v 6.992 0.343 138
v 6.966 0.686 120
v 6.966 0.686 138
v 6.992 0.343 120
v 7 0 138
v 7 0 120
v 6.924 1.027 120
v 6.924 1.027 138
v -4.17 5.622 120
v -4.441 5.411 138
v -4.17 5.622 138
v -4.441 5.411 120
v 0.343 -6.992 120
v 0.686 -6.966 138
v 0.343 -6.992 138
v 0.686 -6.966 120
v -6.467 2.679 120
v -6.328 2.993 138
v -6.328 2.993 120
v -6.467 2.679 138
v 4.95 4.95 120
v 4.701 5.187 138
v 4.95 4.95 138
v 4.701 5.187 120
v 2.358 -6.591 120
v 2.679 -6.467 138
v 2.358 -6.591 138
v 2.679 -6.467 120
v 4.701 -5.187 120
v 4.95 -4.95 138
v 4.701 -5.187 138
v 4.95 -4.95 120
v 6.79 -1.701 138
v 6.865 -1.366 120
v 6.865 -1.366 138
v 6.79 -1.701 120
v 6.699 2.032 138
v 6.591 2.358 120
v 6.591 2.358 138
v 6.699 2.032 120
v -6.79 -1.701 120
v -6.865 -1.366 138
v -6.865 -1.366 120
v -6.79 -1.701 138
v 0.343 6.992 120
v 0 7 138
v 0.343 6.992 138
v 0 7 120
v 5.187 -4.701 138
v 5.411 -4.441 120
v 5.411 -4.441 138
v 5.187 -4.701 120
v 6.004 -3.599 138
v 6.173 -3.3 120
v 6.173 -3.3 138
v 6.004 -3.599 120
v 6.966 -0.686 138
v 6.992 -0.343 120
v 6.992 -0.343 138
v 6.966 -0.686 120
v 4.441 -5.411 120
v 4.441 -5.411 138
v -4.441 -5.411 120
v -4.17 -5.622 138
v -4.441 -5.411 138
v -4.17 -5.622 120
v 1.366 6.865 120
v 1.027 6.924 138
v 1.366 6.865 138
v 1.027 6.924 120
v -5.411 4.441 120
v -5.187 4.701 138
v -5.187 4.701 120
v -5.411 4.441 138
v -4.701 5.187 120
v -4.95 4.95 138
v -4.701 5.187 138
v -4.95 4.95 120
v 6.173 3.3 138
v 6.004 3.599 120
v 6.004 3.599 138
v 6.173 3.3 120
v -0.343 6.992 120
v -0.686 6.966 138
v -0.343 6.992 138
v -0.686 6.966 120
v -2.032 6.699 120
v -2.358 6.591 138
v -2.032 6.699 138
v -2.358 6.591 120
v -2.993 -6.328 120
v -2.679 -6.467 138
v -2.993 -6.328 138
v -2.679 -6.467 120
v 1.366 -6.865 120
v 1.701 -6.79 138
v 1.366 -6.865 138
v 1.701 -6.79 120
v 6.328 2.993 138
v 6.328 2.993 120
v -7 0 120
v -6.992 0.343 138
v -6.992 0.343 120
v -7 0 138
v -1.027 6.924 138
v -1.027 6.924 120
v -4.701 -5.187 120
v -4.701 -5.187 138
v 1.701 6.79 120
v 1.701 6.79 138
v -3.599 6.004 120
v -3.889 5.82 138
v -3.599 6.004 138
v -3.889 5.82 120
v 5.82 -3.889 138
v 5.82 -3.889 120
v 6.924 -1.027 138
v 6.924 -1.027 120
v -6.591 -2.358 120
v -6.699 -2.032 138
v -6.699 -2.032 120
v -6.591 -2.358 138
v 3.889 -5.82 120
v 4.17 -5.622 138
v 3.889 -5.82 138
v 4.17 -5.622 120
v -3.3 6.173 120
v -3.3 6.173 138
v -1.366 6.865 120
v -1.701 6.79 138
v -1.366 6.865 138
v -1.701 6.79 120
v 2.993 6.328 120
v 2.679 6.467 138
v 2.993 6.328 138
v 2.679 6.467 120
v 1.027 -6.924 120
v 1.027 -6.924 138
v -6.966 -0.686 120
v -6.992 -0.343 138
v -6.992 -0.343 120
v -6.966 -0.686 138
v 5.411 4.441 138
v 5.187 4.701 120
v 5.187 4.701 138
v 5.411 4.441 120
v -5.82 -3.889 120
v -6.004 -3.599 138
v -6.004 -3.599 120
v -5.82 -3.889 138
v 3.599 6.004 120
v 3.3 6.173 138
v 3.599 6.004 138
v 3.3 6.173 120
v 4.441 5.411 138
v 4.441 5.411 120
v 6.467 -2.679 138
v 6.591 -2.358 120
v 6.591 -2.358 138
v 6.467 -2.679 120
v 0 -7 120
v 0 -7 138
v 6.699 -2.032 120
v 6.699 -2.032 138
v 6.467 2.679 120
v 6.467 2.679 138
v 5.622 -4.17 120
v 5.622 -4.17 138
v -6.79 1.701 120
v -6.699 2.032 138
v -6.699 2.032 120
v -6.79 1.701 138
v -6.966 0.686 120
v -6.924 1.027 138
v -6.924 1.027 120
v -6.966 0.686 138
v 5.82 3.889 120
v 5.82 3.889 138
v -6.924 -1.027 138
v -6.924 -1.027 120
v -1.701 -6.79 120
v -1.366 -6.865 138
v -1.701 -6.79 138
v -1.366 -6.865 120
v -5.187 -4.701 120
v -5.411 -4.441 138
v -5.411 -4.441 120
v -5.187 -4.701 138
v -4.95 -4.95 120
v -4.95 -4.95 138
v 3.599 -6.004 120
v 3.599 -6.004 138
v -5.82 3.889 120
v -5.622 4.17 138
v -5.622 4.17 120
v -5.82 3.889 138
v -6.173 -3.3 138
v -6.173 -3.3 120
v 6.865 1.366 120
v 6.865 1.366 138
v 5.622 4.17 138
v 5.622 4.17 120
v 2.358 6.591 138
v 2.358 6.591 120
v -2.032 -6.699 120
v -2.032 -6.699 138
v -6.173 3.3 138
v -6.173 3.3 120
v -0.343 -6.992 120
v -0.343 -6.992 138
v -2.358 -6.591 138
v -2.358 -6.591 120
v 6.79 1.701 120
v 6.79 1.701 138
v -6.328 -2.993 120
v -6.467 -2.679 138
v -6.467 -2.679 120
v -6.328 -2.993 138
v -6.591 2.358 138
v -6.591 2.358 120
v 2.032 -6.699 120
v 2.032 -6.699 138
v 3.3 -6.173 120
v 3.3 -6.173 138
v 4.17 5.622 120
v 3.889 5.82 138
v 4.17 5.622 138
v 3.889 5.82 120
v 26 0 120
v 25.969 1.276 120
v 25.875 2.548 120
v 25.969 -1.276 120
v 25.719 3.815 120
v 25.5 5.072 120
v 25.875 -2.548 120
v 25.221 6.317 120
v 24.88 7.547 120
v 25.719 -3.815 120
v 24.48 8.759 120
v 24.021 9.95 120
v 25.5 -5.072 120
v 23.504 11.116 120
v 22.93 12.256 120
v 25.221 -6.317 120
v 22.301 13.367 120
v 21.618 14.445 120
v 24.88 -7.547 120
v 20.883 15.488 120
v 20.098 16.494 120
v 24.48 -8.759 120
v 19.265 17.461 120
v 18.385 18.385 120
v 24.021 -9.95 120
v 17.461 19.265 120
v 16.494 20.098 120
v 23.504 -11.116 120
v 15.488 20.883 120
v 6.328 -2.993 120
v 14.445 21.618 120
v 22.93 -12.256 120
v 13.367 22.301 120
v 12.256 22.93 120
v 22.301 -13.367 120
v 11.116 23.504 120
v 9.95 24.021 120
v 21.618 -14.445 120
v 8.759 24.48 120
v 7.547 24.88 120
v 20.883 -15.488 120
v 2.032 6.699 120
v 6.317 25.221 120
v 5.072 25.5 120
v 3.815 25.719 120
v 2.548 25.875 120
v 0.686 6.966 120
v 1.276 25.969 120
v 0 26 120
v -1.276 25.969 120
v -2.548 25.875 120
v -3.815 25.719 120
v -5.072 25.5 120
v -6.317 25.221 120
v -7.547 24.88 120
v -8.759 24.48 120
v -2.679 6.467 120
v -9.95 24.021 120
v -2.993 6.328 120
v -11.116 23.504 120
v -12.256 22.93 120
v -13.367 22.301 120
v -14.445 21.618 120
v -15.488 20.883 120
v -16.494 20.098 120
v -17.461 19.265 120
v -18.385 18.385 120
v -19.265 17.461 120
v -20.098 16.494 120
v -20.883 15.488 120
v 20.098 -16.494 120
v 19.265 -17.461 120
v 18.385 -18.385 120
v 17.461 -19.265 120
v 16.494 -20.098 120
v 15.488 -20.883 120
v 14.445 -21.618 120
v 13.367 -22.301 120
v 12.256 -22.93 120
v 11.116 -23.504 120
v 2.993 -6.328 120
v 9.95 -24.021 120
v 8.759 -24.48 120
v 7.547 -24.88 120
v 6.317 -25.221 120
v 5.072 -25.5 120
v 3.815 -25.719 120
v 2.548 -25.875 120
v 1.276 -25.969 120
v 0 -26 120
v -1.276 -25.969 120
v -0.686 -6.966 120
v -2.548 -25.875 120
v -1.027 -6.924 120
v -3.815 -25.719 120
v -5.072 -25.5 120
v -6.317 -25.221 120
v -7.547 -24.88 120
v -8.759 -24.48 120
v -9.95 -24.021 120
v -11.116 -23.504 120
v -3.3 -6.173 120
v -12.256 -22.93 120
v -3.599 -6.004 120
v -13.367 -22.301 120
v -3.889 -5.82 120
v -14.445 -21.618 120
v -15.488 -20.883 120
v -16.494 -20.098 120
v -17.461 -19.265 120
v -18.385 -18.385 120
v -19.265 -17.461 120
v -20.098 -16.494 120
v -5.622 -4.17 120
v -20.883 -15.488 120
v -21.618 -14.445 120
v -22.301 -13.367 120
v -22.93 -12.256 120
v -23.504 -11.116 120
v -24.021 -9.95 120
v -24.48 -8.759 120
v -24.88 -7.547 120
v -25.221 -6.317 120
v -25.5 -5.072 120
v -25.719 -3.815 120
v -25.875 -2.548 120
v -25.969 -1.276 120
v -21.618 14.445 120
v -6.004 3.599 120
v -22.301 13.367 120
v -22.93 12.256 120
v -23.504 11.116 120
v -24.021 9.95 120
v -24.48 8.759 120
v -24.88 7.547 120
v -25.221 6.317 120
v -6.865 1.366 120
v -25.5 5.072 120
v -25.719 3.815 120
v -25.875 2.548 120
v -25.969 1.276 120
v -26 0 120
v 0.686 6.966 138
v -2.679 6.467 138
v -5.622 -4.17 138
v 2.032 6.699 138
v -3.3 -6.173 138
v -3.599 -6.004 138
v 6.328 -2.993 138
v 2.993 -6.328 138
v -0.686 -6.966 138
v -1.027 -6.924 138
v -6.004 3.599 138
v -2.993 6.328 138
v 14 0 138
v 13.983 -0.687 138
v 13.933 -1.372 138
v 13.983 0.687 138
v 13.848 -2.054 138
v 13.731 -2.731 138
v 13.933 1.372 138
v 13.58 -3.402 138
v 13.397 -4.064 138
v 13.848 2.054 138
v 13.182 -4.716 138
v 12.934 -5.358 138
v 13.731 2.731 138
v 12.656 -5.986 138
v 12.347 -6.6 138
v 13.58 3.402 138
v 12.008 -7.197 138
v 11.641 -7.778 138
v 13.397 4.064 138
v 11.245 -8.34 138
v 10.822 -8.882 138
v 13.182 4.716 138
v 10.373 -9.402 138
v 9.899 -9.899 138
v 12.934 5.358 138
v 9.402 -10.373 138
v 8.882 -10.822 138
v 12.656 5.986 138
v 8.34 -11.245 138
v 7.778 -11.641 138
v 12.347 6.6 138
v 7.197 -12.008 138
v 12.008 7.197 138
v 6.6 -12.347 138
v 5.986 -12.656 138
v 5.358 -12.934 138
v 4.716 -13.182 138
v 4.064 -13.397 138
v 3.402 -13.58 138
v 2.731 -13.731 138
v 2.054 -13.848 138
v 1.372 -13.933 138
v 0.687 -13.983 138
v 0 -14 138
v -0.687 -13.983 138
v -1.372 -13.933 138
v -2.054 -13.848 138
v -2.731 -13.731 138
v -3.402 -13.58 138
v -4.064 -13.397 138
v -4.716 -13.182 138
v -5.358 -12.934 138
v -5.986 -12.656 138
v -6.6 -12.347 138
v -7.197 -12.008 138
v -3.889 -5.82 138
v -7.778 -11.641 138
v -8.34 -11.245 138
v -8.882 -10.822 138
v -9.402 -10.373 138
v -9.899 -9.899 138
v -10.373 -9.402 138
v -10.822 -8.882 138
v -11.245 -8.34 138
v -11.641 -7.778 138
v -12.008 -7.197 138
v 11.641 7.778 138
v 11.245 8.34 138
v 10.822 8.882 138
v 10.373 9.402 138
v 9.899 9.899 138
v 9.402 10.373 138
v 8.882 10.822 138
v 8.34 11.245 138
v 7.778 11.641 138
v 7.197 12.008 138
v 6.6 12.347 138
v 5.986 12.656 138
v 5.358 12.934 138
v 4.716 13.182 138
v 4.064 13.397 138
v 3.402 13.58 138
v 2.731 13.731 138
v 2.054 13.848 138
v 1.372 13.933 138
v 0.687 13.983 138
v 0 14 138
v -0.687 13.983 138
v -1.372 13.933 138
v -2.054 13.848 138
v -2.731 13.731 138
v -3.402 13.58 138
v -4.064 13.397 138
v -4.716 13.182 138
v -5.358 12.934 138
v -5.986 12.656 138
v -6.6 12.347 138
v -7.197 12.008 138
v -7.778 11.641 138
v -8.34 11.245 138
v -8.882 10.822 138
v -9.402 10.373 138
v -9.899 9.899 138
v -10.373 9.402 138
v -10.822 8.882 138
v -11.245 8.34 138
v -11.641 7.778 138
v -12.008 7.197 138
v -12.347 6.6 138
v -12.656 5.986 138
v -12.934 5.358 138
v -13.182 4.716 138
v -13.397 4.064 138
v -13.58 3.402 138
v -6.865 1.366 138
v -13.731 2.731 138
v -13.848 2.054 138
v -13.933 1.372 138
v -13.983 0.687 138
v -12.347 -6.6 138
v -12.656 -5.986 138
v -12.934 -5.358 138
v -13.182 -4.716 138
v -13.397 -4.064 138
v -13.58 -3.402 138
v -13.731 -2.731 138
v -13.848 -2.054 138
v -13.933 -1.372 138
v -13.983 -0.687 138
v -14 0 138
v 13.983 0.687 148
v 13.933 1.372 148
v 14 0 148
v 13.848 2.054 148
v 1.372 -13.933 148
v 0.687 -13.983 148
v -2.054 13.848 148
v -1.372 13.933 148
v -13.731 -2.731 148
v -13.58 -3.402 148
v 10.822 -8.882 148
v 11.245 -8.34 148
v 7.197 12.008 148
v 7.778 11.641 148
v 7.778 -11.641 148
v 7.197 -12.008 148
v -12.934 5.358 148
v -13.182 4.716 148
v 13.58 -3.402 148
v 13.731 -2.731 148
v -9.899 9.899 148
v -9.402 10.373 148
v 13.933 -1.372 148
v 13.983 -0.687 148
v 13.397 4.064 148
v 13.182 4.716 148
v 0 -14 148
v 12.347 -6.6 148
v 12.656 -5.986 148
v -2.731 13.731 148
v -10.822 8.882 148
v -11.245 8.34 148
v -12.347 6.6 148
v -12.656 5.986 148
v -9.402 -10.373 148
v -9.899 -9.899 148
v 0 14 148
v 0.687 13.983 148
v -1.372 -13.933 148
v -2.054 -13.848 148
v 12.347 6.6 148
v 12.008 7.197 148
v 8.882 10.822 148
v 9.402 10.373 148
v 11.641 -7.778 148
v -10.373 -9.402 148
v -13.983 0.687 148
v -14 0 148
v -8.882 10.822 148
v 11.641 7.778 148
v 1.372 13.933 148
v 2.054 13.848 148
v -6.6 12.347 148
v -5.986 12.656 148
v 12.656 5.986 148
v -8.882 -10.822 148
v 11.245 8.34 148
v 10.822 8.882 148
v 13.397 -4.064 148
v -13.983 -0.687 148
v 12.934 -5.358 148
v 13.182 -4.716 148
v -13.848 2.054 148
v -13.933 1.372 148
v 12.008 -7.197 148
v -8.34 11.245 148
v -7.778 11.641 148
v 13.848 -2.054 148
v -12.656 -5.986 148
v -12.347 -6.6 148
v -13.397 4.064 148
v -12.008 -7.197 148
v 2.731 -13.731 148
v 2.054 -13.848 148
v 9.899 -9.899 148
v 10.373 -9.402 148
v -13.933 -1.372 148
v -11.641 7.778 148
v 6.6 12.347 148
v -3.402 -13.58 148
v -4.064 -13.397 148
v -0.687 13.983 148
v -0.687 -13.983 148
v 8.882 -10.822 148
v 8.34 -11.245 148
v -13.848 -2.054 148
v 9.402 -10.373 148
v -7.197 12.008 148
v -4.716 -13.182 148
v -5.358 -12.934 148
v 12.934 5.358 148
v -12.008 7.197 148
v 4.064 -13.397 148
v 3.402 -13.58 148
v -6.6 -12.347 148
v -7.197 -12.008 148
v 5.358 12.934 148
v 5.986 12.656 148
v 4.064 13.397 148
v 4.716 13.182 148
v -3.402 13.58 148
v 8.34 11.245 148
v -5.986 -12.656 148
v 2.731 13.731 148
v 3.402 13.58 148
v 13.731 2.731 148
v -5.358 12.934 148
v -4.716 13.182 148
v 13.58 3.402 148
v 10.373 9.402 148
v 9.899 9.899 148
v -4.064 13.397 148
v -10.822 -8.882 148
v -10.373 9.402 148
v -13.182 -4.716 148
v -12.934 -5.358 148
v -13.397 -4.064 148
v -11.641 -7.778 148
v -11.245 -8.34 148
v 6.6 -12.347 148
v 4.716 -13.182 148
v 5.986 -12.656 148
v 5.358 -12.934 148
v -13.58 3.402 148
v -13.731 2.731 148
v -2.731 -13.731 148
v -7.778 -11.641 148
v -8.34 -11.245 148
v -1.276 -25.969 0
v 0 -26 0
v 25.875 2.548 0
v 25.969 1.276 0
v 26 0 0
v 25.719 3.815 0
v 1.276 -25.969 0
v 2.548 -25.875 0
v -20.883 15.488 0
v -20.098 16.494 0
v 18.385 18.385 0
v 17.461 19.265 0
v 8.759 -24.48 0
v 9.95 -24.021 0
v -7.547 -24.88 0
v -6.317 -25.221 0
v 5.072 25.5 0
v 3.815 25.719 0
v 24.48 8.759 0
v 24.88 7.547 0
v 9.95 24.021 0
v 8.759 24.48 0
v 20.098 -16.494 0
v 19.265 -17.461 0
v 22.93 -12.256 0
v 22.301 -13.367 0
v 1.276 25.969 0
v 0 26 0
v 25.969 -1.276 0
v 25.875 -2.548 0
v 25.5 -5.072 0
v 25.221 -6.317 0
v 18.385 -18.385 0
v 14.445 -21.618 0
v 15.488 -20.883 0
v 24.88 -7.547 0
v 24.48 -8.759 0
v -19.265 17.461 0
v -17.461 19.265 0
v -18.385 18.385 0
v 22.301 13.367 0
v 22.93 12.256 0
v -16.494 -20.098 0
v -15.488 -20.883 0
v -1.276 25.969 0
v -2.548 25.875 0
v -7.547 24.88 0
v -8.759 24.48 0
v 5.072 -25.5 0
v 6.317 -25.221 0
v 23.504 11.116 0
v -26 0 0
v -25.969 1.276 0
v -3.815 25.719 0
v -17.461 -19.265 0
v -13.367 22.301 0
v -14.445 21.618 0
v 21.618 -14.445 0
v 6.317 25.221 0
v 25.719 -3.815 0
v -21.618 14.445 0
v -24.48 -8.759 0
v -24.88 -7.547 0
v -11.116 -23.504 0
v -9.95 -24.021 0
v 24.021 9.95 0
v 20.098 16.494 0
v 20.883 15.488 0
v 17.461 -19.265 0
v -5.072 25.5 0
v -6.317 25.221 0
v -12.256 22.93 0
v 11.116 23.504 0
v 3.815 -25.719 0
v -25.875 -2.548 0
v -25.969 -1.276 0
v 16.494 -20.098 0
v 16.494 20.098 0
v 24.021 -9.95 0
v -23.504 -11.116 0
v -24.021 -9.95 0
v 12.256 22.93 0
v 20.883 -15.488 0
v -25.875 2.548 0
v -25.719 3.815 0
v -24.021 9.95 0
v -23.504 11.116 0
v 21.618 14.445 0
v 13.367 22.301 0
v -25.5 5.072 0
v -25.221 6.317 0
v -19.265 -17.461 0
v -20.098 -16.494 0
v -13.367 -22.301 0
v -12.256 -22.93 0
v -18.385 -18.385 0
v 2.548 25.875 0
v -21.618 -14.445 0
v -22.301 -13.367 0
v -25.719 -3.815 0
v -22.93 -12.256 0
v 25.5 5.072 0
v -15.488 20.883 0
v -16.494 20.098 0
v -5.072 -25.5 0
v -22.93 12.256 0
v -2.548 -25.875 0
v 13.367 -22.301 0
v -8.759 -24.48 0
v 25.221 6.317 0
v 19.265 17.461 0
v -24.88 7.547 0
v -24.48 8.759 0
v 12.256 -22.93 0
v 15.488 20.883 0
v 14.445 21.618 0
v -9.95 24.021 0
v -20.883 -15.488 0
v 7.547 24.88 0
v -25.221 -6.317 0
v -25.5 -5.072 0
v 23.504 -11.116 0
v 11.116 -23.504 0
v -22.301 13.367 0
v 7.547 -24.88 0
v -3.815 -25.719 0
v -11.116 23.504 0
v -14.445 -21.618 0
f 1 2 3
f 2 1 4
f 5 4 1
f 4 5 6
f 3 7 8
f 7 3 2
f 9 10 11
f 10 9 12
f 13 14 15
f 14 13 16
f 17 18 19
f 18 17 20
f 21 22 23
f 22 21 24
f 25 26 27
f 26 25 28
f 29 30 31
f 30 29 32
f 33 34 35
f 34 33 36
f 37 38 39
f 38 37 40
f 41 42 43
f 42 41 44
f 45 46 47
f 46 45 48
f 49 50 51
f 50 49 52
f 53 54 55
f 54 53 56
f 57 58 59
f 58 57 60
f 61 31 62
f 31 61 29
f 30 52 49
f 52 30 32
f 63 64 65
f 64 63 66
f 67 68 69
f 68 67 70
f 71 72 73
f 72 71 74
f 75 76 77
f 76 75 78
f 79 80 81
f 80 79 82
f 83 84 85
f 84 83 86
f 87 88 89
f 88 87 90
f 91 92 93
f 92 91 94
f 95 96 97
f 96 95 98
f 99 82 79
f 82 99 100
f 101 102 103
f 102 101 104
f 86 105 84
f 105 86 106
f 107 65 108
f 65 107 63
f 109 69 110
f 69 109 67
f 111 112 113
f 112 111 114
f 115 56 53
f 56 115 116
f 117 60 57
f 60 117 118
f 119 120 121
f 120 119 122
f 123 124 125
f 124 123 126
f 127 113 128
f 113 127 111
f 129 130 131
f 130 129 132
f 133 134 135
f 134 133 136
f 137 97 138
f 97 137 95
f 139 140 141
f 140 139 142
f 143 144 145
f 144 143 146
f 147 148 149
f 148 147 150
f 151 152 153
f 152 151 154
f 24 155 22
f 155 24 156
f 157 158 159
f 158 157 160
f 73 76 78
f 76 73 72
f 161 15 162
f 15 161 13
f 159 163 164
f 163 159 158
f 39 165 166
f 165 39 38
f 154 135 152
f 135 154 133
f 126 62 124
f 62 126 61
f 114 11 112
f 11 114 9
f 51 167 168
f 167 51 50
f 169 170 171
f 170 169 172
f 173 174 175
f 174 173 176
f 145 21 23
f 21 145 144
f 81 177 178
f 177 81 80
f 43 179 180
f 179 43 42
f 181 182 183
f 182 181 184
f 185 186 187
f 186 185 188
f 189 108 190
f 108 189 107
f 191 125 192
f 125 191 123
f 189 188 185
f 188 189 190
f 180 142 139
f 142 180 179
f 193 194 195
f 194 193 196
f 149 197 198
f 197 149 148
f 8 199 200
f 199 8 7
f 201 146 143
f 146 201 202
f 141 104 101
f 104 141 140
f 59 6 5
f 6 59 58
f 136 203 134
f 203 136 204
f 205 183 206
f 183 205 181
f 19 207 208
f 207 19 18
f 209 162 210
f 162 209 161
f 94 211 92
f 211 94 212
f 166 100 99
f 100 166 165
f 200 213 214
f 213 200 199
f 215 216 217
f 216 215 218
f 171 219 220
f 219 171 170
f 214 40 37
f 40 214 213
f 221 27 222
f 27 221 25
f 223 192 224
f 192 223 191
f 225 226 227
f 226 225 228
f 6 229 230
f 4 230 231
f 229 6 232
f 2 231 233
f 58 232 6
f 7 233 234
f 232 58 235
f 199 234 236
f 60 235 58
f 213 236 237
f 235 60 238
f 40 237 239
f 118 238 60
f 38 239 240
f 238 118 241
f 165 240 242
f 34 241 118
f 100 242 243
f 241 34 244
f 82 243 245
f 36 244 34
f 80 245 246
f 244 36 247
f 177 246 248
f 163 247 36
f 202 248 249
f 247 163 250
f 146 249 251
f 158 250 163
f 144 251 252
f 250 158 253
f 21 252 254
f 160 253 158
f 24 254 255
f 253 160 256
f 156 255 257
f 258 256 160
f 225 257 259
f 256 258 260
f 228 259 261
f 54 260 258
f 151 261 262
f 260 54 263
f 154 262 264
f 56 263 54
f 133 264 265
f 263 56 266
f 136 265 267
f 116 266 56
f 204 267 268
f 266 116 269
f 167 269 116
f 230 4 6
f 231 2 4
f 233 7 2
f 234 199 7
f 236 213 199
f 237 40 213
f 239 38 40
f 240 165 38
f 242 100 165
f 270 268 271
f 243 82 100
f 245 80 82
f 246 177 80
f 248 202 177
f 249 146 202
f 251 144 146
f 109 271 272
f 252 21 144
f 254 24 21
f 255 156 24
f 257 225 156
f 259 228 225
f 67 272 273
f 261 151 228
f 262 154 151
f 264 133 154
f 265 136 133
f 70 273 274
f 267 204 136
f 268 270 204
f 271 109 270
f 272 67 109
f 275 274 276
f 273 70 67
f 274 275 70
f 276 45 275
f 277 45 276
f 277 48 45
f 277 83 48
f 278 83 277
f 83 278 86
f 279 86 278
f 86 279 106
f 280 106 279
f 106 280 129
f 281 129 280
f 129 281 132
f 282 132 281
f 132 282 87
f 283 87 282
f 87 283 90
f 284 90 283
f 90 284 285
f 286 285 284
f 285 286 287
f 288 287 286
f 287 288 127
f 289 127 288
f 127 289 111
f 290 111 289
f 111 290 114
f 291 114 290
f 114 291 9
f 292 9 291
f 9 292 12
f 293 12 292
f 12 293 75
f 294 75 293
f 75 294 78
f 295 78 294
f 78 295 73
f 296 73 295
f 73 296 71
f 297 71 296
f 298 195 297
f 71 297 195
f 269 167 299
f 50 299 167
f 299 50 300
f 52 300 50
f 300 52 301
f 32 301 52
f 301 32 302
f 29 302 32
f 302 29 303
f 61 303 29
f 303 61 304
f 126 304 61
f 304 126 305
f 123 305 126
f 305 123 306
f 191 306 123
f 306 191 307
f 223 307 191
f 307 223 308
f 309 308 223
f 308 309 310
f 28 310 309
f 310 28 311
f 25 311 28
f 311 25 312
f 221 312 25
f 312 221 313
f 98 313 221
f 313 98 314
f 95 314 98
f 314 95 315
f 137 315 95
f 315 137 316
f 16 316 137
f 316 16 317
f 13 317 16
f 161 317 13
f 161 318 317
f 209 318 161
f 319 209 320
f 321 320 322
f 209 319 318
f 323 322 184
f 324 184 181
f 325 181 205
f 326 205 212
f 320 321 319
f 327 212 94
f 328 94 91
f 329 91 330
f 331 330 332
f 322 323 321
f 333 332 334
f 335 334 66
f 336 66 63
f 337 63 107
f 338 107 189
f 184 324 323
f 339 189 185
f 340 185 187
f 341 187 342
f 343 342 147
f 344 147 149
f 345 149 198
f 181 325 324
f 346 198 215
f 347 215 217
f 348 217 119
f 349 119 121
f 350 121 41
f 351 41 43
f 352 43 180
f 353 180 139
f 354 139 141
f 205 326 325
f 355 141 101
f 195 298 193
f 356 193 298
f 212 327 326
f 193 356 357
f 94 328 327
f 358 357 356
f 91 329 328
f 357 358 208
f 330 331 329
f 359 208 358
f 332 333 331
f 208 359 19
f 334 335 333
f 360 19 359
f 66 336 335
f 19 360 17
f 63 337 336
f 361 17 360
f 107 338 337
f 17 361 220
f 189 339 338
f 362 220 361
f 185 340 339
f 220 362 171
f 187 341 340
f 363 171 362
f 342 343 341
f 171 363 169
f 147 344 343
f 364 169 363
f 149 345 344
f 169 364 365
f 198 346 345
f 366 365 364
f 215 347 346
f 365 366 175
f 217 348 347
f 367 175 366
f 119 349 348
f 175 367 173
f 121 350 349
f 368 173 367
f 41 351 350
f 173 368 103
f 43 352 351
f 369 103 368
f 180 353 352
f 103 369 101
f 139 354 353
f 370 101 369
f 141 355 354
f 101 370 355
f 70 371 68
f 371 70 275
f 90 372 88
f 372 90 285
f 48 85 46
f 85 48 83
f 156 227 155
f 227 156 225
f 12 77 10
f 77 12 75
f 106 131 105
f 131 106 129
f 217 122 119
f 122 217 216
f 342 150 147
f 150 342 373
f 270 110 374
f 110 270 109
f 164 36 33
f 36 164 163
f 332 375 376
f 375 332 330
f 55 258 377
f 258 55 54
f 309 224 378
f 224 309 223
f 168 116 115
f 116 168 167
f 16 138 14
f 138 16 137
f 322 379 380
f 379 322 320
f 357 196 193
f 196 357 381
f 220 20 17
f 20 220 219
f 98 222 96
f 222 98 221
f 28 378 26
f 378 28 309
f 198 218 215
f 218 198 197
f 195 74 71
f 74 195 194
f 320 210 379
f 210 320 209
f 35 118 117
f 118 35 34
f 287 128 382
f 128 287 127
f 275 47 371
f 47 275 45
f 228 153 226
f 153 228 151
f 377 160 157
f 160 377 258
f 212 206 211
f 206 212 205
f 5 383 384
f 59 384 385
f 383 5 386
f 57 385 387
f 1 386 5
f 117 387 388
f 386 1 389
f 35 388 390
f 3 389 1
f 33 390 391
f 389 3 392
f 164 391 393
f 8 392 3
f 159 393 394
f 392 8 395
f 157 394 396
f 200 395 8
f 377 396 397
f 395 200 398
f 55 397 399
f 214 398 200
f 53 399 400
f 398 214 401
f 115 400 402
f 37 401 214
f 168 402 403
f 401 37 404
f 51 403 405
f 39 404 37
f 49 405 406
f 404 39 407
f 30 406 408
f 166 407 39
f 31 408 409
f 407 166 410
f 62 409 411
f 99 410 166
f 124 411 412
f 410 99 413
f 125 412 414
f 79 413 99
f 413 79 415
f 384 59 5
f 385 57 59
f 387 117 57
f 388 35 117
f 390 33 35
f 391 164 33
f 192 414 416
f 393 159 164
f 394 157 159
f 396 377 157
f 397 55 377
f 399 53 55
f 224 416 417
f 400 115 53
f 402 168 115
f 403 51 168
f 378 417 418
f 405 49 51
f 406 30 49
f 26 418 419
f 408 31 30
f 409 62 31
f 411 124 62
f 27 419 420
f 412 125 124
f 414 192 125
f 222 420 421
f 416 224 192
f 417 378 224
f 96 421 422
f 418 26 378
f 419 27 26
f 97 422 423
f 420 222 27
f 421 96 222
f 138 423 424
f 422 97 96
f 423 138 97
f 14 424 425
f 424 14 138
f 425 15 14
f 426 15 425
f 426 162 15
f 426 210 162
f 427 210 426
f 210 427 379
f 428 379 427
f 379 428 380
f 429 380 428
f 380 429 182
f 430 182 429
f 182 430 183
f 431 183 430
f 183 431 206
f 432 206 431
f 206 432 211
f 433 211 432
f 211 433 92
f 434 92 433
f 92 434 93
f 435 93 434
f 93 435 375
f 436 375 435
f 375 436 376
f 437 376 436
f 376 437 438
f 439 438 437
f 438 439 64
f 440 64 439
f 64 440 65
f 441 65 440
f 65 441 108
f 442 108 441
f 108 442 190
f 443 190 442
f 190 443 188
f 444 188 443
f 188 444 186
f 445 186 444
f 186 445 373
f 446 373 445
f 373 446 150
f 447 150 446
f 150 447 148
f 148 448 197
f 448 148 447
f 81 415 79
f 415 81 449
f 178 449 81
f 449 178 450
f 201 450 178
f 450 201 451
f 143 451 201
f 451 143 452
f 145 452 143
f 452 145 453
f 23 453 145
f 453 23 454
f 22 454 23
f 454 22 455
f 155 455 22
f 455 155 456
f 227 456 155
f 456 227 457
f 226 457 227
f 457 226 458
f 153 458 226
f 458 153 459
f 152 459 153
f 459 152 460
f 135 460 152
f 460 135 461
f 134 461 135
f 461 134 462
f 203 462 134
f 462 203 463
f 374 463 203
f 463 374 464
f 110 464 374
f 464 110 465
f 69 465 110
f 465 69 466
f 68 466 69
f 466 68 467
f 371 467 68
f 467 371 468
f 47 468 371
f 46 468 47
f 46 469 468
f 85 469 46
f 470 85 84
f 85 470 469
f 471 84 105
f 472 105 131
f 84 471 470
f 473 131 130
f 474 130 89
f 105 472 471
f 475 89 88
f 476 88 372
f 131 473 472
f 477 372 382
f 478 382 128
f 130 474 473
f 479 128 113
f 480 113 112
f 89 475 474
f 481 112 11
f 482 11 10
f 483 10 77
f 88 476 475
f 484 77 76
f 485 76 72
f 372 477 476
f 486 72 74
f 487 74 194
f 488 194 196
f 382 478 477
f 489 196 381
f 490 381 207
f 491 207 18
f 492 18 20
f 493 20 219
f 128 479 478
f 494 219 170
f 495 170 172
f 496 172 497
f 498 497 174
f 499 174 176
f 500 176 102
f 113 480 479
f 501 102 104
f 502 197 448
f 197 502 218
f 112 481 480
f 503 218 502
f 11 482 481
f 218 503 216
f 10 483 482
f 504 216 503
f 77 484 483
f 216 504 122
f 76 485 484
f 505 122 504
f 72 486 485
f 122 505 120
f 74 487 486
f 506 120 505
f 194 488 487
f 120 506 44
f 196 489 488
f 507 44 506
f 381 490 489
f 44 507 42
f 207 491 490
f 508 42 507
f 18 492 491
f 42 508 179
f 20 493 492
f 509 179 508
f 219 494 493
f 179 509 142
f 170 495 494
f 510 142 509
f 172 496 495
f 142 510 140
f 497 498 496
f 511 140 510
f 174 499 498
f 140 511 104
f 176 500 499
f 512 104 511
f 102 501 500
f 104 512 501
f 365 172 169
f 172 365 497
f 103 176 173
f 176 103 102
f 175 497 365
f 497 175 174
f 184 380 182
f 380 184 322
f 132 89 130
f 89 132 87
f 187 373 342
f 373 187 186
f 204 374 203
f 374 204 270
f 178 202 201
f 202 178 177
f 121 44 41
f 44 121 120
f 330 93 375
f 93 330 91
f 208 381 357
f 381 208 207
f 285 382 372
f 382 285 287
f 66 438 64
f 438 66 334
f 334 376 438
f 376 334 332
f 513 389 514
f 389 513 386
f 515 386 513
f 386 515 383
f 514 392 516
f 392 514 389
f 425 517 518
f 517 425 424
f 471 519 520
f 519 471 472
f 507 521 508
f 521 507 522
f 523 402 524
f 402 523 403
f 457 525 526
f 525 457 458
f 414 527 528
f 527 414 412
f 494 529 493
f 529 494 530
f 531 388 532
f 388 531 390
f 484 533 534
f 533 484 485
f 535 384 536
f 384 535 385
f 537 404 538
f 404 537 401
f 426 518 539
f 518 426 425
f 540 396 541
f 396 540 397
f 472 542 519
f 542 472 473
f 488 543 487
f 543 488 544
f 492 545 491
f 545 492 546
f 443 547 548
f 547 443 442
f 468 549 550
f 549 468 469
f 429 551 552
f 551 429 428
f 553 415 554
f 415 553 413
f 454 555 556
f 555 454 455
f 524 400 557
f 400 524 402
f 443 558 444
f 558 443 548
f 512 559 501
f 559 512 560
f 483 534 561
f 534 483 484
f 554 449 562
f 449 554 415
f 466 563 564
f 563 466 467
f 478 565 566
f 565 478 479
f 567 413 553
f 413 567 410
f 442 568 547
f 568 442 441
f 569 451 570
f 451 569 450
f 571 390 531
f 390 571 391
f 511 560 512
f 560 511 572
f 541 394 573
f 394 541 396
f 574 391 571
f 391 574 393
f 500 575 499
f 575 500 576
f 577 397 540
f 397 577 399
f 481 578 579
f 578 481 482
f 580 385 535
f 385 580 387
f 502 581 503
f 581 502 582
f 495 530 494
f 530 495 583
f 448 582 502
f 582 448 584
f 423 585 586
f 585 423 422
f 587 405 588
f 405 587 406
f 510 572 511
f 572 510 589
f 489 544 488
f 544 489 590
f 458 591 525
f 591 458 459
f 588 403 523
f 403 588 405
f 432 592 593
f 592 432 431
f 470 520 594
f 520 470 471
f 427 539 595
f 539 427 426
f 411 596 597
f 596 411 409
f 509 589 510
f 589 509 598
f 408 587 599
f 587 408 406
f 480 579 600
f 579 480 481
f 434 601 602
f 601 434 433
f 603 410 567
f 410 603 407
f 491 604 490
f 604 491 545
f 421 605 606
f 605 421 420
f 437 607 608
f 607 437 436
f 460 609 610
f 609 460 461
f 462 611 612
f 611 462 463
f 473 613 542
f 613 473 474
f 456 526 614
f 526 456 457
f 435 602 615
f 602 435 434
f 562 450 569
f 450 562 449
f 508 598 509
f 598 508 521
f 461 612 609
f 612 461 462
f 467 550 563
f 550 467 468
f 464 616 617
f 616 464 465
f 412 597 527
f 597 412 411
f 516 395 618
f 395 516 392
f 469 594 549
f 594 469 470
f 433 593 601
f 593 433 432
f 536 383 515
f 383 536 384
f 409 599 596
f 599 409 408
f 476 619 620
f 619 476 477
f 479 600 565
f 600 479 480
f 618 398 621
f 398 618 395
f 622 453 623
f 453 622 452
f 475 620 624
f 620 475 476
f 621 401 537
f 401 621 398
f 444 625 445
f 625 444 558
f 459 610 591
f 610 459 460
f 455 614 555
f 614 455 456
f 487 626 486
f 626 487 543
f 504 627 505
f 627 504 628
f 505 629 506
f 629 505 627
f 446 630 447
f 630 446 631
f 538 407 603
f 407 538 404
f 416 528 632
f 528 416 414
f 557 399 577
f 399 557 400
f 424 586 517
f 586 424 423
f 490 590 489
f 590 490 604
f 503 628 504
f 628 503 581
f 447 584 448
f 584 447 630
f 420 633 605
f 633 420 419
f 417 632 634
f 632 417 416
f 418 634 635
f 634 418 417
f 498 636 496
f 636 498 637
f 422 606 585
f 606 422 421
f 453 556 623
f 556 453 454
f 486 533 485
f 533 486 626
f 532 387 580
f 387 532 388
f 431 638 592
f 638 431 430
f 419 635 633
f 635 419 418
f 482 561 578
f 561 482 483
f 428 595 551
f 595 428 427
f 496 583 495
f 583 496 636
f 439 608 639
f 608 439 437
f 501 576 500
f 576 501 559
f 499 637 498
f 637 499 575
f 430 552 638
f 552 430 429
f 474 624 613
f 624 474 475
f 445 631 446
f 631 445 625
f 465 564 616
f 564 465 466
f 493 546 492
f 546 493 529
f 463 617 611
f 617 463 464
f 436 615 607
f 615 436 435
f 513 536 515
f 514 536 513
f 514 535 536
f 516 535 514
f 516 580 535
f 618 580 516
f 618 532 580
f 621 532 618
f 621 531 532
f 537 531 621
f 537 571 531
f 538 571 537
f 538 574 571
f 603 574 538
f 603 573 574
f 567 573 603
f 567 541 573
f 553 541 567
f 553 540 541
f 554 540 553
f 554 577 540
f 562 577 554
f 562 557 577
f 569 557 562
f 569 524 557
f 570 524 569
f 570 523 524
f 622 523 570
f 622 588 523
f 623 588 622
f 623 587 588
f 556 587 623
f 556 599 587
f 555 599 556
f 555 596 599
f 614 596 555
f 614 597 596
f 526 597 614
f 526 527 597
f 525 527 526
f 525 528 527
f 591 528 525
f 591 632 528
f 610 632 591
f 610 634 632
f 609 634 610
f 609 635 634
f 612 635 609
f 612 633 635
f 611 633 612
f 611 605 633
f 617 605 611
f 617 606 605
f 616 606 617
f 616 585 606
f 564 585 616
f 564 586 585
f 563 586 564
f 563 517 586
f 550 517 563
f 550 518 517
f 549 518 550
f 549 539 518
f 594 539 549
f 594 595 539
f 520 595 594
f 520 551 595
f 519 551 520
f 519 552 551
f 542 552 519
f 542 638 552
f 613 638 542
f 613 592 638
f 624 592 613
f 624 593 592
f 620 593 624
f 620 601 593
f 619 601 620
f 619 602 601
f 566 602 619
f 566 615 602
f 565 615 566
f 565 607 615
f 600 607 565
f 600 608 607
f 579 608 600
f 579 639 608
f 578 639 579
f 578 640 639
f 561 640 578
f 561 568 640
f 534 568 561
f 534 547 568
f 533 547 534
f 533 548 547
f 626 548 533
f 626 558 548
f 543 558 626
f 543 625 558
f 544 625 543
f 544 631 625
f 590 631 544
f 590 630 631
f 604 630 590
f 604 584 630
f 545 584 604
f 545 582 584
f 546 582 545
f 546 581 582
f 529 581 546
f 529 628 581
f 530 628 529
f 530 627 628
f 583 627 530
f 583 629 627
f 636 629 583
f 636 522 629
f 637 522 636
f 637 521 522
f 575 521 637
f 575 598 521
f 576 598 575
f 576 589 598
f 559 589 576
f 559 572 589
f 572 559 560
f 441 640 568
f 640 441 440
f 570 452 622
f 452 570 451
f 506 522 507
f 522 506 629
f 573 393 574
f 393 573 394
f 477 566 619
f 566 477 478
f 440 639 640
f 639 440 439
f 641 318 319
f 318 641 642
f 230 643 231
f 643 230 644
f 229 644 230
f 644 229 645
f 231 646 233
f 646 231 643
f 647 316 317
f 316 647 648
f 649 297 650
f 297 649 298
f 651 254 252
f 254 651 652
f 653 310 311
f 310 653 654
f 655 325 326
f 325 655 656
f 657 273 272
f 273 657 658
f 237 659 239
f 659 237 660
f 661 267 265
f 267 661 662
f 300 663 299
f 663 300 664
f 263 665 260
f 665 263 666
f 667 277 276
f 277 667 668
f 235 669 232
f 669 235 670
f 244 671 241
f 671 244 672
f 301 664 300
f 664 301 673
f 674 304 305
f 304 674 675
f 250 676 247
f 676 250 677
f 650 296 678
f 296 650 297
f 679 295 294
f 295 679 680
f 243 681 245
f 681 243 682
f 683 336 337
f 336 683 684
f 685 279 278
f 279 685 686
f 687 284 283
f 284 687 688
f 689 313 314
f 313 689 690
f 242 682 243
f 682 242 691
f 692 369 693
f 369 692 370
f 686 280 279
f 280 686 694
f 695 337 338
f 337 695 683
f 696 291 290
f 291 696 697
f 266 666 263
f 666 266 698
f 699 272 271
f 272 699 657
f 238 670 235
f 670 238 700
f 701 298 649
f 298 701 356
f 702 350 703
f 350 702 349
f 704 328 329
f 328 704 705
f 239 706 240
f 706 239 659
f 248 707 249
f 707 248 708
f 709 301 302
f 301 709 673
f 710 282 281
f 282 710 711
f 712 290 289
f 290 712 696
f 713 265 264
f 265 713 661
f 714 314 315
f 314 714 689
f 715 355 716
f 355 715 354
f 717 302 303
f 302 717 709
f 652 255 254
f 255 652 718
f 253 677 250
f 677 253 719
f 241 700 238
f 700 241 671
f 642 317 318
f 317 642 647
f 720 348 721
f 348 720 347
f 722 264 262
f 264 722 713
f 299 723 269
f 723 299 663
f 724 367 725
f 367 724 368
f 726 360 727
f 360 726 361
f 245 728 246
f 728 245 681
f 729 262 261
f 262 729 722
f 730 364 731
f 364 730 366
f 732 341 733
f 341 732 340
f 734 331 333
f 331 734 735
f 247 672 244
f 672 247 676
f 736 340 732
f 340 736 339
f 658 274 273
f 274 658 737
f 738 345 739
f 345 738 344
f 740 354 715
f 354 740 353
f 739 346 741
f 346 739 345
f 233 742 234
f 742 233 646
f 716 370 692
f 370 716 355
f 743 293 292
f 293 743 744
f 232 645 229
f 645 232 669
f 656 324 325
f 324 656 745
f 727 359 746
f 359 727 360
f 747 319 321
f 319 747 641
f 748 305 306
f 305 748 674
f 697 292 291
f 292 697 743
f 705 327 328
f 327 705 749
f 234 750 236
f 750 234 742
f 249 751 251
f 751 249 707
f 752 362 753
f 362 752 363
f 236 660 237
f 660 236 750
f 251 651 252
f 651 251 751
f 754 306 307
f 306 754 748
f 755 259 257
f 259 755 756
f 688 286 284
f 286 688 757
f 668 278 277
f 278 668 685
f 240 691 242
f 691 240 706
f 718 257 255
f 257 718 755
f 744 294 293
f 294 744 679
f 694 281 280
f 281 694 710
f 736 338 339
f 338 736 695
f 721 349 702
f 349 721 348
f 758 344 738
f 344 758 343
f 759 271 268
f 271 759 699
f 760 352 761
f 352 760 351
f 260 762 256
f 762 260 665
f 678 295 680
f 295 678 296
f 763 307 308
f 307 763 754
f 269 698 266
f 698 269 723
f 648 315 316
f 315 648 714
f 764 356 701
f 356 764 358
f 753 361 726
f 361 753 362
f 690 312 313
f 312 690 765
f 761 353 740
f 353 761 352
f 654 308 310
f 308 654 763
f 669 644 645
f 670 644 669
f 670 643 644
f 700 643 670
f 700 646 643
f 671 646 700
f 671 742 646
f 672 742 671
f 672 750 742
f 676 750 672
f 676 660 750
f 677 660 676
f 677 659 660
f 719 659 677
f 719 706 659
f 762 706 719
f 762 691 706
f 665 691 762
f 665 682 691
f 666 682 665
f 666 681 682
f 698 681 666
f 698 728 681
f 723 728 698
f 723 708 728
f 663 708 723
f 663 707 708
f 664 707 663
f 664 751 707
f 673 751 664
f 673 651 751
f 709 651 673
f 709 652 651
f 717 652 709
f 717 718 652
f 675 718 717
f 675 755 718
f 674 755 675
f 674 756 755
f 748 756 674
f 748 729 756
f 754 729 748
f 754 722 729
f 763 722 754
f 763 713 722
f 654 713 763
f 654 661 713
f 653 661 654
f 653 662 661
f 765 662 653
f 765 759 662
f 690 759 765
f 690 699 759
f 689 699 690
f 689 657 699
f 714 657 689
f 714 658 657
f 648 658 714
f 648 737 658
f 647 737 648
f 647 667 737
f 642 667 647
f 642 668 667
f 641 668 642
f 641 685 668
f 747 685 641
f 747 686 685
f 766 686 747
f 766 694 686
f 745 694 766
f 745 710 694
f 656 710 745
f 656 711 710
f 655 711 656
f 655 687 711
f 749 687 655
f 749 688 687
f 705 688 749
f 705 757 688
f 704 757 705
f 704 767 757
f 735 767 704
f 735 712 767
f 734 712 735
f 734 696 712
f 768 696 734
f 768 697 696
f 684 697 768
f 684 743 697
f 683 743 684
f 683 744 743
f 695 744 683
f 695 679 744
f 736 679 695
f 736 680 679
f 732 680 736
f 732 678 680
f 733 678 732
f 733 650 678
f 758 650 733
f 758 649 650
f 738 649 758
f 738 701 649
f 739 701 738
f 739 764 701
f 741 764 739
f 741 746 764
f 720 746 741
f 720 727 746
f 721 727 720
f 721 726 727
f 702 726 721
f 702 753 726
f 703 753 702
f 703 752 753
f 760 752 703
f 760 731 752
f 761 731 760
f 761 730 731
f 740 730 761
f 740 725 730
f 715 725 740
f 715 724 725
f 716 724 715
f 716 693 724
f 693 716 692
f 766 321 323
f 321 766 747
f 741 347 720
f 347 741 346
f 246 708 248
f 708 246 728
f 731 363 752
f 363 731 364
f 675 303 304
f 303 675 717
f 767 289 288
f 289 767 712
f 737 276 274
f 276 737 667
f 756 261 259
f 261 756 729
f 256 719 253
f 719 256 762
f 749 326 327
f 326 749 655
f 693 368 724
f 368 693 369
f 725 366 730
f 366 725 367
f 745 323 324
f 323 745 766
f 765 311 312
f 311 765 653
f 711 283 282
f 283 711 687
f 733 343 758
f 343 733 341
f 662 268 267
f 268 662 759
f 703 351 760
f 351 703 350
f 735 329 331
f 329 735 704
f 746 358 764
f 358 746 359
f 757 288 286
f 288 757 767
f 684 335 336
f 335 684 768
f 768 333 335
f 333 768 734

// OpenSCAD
// Push 3: exact simplified MuJoCo exterior reference, units: mm.
// Source: shadow_hand_push3.xml
// SHA-256: 7c90d46de779c5a5292c0421d92f069de7fee593c44bb7eee9fe7e5369365697
// Not a working push-button mechanism: no bore, guide, stop, or spring seat.
// In the simulator the body/plunger collision pair is excluded; positive
// press_mm intentionally makes the solid reference shapes interpenetrate.

$fn = 128;
view = "assembly"; // "assembly", "body", "plunger", "exploded"
press_mm = 0;    // 0 .. 12; simulator travel toward -Z
exploded_gap_mm = 12;

body_d_mm = 52;
body_h_mm = 120;
neck_d_mm = 14;
neck_h_mm = 18;
button_d_mm = 28;
button_h_mm = 10;
stroke_mm = 12;

module push3_body() {
    cylinder(d=body_d_mm, h=body_h_mm);
}

module push3_plunger() {
    union() {
        cylinder(d=neck_d_mm, h=neck_h_mm);
        translate([0, 0, neck_h_mm])
            cylinder(d=button_d_mm, h=button_h_mm);
    }
}

module push3_assembly(press=0, gap=0) {
    color([0.90, 0.93, 0.97]) push3_body();
    color([0.20, 0.36, 0.62])
        translate([0, 0, body_h_mm - press + gap]) push3_plunger();
}

assert(press_mm >= 0 && press_mm <= stroke_mm, "press_mm outside MuJoCo range");
if (view == "body") push3_body();
else if (view == "plunger") push3_plunger();
else if (view == "exploded") push3_assembly(0, exploded_gap_mm);
else push3_assembly(press_mm);
